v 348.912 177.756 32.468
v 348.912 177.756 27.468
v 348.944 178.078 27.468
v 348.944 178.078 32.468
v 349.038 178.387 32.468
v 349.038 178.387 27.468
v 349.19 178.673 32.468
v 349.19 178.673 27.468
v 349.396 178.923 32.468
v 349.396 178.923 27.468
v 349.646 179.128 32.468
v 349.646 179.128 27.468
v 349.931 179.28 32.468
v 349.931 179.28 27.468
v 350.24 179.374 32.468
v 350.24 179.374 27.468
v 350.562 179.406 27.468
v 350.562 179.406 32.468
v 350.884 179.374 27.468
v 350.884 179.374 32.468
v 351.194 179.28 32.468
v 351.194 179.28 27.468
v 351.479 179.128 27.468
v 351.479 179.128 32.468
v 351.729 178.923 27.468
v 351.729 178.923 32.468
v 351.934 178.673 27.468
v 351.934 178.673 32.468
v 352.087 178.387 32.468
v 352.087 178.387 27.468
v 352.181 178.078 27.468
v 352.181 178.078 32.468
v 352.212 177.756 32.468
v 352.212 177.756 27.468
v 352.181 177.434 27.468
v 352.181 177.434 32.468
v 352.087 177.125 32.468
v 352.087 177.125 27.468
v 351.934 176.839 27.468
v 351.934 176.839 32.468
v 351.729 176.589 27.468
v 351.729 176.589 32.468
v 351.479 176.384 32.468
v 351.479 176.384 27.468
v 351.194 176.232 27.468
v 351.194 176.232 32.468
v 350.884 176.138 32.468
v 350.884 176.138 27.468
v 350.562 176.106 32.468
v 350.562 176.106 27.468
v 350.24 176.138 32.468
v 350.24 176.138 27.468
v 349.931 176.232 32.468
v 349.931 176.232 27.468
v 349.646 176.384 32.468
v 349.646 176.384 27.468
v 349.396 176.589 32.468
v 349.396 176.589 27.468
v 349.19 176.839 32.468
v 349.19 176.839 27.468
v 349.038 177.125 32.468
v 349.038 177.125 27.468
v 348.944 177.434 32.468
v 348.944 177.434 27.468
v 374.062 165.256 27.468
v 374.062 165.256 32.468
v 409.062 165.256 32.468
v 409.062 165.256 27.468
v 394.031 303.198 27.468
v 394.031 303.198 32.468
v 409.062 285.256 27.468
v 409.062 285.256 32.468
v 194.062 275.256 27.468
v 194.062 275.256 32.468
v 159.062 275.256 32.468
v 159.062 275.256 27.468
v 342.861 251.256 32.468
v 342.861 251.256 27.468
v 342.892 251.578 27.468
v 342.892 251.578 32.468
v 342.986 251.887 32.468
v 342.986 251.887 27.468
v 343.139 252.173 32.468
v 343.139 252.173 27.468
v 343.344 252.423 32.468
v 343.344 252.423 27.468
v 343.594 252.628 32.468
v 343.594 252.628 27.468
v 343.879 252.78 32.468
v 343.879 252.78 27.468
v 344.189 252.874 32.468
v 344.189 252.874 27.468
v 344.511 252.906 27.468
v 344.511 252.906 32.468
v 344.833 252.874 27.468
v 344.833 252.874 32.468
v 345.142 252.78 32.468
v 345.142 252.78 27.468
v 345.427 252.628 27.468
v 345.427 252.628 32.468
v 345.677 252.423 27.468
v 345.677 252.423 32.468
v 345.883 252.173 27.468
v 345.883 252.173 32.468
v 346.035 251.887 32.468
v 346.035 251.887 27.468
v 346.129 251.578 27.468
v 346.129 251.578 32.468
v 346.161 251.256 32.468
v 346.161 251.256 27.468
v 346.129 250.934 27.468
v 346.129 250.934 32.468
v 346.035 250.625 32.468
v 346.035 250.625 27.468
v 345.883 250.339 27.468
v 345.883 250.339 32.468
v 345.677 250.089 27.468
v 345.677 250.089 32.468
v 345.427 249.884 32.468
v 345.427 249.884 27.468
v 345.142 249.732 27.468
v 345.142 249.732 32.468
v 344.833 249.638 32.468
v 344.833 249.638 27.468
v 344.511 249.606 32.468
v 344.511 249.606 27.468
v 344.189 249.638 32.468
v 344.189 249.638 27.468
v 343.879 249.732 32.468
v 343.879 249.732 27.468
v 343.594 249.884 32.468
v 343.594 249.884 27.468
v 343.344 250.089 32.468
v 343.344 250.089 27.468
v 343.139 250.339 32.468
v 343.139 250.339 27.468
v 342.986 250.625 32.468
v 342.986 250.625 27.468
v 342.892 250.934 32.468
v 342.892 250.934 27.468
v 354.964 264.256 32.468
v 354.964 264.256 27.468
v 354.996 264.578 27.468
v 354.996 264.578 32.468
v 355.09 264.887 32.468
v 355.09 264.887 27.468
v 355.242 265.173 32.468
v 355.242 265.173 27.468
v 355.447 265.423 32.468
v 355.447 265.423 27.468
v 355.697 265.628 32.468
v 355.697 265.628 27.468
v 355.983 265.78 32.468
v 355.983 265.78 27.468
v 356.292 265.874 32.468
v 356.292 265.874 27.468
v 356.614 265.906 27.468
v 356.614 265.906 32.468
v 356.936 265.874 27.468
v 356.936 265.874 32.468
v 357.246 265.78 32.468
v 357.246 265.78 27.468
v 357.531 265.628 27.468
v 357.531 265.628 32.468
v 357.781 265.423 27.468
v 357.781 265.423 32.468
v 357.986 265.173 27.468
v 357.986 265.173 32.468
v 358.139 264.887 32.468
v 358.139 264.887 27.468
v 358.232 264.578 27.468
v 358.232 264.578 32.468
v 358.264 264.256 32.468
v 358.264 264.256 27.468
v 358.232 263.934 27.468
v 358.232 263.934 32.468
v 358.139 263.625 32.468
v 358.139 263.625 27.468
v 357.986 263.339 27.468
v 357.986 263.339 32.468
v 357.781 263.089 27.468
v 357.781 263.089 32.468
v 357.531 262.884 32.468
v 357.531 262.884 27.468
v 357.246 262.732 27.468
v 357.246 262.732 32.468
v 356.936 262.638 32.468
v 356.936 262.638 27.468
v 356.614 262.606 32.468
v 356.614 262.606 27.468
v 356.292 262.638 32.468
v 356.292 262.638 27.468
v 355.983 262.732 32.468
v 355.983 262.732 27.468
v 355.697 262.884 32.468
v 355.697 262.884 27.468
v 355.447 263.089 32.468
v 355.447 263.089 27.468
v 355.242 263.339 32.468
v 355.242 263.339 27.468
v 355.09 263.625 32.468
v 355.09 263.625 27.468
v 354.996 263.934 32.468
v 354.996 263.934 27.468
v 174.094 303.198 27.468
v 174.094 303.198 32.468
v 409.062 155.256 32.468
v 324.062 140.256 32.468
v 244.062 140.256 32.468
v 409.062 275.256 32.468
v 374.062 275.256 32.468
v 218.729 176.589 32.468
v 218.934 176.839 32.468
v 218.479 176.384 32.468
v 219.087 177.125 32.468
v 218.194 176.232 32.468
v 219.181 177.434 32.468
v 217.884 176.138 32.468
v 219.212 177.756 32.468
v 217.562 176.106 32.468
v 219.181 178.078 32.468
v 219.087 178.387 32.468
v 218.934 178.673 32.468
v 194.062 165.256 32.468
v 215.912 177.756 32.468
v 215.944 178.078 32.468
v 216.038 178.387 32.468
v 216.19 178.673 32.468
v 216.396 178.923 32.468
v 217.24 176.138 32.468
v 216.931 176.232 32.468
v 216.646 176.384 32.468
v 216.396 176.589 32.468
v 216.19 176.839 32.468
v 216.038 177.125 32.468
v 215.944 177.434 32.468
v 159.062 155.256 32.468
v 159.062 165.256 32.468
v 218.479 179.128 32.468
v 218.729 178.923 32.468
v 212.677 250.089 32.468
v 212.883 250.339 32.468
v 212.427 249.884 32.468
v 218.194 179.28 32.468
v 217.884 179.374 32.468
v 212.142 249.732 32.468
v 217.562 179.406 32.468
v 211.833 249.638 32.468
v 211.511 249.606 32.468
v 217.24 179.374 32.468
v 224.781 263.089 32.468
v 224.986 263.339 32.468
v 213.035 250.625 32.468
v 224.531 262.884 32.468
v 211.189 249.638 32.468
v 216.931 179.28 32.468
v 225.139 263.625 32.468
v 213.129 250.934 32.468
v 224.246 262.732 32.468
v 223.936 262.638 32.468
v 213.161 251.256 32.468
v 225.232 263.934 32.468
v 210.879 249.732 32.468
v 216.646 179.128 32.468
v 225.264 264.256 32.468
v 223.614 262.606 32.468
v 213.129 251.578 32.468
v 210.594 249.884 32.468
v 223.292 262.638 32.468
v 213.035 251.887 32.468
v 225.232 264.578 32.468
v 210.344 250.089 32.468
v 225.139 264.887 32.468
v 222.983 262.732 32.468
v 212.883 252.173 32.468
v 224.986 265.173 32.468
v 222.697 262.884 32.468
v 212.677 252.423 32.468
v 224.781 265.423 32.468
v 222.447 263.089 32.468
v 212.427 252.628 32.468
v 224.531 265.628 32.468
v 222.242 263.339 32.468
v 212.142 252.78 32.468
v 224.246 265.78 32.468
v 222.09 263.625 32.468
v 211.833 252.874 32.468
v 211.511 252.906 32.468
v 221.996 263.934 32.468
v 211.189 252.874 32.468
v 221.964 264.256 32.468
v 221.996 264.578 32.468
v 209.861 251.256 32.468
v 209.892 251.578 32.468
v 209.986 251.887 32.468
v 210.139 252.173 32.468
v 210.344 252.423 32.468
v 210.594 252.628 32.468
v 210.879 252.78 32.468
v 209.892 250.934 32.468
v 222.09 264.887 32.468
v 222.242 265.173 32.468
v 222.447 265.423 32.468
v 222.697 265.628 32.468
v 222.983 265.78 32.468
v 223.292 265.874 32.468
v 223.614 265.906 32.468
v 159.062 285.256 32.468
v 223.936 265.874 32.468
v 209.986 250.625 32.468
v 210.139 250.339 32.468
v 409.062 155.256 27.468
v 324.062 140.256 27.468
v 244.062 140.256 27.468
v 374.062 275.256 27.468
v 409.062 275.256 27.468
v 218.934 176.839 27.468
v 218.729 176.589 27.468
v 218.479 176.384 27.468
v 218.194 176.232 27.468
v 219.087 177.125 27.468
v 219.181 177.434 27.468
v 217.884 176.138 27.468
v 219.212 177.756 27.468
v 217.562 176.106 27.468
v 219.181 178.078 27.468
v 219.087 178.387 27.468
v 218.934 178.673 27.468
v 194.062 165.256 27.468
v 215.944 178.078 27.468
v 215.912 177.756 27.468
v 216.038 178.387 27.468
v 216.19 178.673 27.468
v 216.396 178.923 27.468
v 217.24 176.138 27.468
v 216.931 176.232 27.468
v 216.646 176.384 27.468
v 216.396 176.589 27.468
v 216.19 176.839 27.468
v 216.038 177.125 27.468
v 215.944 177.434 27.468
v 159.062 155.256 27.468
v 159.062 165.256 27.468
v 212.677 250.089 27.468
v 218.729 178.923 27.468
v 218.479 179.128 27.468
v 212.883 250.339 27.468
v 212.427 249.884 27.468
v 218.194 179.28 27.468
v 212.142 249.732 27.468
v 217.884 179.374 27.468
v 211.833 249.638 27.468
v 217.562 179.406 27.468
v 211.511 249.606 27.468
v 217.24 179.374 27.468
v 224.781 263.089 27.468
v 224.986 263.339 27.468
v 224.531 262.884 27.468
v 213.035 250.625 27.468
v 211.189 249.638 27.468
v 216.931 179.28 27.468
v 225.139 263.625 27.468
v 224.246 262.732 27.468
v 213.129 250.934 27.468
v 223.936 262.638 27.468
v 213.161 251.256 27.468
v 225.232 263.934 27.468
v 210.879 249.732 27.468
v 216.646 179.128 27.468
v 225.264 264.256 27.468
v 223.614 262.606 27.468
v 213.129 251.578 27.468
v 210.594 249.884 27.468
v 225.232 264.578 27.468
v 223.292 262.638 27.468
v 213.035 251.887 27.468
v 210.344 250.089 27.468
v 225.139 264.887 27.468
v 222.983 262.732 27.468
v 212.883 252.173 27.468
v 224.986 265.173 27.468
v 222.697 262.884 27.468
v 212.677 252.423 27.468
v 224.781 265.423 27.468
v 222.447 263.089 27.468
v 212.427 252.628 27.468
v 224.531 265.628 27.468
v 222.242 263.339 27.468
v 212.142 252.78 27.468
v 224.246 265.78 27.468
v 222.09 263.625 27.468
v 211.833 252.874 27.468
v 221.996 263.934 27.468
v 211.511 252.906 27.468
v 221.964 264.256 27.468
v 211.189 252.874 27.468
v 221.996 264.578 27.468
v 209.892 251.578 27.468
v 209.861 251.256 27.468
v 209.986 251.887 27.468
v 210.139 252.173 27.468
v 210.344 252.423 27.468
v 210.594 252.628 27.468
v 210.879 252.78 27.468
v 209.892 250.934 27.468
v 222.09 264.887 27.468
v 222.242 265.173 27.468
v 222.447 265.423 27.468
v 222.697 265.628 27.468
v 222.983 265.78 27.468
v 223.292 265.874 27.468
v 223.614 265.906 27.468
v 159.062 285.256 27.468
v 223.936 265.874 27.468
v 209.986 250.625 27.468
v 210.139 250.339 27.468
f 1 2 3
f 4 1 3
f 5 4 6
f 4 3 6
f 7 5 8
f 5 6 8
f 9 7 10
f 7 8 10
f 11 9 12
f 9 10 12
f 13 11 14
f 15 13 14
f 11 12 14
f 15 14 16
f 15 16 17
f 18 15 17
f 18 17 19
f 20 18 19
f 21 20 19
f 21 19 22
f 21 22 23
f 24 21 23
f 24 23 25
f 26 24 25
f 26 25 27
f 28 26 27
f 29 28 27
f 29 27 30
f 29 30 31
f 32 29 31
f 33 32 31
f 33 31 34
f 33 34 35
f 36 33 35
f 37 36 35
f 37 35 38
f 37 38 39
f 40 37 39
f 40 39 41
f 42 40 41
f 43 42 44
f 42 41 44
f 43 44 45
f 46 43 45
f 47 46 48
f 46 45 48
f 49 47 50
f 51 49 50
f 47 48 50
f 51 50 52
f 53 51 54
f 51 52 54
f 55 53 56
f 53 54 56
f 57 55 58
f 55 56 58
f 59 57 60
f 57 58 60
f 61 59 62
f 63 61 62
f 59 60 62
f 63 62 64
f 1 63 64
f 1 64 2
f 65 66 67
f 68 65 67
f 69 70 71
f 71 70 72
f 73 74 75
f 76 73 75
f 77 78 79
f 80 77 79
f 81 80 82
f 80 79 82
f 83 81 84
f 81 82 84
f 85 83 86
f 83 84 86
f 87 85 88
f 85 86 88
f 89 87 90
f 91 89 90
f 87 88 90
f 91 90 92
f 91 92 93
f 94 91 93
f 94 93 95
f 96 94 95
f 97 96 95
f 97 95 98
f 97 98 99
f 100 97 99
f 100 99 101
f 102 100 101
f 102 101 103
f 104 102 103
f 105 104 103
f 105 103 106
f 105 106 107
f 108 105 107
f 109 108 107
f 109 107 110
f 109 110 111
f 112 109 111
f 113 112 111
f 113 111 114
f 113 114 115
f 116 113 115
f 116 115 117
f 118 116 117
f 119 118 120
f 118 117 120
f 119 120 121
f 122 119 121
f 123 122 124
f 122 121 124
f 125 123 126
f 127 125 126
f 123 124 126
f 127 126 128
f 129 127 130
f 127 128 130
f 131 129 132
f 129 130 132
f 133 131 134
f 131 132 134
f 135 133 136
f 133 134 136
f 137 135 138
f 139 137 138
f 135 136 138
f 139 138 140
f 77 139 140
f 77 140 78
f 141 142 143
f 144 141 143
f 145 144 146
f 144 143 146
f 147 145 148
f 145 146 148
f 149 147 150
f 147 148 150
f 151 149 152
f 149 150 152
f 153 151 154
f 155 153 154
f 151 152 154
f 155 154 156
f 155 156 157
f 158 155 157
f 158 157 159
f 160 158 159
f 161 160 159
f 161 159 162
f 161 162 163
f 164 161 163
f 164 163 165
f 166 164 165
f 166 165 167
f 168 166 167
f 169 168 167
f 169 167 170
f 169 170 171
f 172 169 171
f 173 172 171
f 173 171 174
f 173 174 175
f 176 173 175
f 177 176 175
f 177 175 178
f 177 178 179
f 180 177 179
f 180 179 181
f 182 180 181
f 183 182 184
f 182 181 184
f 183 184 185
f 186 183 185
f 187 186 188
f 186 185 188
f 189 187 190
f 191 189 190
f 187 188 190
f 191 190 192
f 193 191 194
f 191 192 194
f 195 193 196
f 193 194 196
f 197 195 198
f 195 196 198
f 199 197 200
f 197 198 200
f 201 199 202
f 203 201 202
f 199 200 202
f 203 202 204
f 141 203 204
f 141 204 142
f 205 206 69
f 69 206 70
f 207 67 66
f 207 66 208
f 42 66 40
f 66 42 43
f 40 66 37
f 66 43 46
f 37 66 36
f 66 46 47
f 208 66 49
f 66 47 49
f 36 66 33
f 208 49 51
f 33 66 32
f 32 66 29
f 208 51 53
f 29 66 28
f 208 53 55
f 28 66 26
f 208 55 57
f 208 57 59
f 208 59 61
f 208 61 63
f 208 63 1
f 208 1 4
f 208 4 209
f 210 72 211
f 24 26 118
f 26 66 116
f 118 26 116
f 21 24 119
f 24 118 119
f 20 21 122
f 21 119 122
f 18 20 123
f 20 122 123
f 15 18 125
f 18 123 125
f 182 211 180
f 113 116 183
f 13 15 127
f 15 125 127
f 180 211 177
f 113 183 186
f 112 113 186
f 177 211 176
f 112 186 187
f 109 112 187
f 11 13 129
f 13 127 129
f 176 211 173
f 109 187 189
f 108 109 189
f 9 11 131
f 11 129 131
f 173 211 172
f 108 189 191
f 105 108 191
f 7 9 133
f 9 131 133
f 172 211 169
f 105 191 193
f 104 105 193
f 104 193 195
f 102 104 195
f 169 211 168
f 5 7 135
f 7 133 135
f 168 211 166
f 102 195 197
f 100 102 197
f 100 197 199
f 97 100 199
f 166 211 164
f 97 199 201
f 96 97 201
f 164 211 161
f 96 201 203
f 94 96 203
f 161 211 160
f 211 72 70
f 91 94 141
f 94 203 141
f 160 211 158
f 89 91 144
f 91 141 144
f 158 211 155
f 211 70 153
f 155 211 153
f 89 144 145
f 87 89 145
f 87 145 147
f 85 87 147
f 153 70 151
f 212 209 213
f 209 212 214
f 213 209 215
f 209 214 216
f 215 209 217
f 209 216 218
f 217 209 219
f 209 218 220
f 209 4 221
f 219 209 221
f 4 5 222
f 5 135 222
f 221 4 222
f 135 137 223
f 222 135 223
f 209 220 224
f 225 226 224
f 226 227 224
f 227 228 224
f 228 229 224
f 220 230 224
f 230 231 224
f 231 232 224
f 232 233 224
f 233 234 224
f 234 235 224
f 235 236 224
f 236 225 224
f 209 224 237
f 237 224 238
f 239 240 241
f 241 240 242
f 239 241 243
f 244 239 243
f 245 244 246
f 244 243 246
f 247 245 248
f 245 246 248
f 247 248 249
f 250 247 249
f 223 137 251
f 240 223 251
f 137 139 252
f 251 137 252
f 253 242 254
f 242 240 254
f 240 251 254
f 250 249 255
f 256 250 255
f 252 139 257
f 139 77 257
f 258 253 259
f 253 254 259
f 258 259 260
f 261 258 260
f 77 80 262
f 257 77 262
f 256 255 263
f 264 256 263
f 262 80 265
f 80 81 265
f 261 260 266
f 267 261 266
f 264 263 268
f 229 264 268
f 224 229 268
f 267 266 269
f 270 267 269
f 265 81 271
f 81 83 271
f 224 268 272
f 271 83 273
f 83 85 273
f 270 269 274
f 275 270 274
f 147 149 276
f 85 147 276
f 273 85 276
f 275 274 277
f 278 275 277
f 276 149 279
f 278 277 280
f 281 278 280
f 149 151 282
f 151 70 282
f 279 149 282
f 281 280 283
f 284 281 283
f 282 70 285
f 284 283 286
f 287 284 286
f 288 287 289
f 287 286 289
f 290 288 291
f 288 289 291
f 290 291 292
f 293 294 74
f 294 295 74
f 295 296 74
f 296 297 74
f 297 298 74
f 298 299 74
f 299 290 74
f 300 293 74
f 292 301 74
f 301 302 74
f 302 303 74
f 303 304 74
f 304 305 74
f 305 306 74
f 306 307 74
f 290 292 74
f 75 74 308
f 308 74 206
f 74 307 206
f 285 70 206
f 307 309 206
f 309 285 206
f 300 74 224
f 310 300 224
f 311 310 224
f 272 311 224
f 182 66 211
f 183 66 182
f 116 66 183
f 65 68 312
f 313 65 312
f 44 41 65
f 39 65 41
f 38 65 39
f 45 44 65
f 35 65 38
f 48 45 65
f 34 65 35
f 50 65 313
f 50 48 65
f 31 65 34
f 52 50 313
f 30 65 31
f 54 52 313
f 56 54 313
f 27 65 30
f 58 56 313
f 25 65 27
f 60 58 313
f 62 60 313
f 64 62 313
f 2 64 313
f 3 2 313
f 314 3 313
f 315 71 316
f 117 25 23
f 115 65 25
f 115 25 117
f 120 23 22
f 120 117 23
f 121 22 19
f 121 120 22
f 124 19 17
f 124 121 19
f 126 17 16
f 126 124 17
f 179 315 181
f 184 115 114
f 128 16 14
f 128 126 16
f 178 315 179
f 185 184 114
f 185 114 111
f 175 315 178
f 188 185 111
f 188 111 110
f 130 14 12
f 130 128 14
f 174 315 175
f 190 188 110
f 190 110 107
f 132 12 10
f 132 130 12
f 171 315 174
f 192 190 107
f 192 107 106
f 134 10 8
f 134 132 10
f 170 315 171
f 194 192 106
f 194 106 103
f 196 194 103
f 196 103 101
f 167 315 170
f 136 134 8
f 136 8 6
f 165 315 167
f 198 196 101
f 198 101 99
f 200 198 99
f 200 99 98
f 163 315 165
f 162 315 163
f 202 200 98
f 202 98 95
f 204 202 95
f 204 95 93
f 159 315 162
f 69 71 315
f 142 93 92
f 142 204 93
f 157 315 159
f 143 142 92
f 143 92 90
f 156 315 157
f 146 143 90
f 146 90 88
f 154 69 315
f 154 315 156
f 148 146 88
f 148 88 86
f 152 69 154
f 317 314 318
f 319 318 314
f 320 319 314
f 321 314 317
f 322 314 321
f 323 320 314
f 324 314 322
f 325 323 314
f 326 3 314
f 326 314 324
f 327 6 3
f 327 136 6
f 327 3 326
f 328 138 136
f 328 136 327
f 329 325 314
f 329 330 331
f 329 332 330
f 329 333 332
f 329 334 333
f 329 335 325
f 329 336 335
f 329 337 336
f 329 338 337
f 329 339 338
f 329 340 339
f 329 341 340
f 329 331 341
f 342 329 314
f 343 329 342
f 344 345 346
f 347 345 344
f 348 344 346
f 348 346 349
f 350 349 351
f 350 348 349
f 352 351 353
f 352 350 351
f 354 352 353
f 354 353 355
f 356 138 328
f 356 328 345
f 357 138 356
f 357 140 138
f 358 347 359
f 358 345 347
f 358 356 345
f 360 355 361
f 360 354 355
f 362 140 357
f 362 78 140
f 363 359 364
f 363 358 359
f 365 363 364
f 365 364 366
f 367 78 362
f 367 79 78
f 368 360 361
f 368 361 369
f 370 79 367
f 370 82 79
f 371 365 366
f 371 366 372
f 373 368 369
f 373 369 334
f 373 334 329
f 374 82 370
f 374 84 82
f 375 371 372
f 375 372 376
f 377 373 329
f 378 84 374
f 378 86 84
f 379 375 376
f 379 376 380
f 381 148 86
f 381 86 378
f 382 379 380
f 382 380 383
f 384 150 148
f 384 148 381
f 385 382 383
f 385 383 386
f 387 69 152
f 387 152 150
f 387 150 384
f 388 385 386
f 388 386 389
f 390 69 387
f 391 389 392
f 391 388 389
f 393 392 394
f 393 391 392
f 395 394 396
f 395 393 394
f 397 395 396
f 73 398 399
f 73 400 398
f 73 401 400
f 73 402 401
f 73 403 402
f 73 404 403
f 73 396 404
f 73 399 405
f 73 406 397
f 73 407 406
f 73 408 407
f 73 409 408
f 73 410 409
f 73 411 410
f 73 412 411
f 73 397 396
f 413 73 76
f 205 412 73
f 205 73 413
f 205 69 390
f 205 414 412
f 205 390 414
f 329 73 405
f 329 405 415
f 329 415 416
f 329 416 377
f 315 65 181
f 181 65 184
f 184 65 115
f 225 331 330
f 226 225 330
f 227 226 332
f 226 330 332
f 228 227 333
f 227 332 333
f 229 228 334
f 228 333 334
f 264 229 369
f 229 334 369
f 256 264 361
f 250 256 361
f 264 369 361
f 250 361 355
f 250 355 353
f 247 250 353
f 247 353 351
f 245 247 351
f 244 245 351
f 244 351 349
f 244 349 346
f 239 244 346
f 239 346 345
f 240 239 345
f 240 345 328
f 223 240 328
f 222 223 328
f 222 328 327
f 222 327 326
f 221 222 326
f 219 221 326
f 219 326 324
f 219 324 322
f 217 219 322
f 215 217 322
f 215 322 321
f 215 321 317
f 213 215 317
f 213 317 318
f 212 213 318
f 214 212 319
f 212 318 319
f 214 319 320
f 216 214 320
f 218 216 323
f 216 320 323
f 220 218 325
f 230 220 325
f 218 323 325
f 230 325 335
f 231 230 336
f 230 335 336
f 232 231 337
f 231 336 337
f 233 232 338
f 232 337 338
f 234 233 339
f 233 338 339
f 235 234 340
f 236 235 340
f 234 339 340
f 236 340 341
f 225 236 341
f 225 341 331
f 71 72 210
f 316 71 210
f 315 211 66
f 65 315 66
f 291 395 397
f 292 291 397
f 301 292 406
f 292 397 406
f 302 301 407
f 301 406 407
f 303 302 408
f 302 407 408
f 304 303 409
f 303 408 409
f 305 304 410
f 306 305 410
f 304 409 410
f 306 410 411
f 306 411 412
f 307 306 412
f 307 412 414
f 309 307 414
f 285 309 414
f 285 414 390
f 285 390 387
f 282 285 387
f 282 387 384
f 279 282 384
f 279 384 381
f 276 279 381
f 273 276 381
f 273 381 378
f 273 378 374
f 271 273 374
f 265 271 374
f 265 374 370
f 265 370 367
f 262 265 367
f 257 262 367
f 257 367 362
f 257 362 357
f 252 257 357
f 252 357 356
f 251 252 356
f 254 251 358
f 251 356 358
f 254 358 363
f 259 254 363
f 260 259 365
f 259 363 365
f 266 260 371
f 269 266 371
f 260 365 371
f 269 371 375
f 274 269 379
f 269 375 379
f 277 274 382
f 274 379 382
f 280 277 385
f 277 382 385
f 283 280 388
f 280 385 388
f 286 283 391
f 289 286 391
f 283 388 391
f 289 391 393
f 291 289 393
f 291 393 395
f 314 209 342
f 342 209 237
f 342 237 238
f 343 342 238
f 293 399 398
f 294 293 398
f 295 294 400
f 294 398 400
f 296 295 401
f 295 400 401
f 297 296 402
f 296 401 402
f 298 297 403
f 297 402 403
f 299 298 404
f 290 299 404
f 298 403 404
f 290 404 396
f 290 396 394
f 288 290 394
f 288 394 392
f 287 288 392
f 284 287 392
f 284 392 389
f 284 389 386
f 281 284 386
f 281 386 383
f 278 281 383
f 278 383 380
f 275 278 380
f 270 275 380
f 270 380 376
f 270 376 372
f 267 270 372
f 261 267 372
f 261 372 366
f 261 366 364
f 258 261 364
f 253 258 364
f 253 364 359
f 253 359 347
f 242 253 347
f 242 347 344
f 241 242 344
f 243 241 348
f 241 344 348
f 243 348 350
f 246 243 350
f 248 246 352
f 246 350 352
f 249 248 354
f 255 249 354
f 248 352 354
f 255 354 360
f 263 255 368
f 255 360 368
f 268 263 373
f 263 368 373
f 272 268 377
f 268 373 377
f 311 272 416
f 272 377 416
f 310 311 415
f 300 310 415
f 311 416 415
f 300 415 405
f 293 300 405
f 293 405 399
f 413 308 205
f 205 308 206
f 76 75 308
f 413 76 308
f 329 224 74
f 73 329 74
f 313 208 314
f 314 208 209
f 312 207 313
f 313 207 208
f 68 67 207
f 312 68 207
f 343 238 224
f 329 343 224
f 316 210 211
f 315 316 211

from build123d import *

# Parameters (mm, degrees)
EXTRUDE_2_DEPTH     = 5
SKETCH_3_R          = 1.65
CUT_EXTRUDE_1_DEPTH = 10


with BuildPart() as part:
    # Эскиз1 → Бобышка-Вытянуть2 (new body)
    with BuildSketch(Plane(origin=(139.725199601, 79.945164962, 32.467820781), x_dir=(-1, 0, 0), z_dir=(0, 0, -1))):
        Polygon((-54.33719348, 85.310831528), (-54.33719348, 195.310831528), (-19.33719348, 195.310831528), (-19.33719348, 205.310831528), (-34.368760963, 223.252548998), (-254.305625996, 223.252548998), (-269.33719348, 205.310831528), (-269.33719348, 195.310831528), (-234.33719348, 195.310831528), (-234.33719348, 85.310831528), (-269.33719348, 85.310831528), (-269.33719348, 75.310831528), (-184.33719348, 60.310831528), (-104.33719348, 60.310831528), (-19.33719348, 75.310831528), (-19.33719348, 85.310831528), align=None)
    extrude(amount=EXTRUDE_2_DEPTH)

    # Эскиз3 → Вырез-Вытянуть1 (cut)
    with BuildSketch(Plane(origin=(0, 0, 27.467820781), x_dir=(-1, 0, 0), z_dir=(0, 0, -1))):
        with Locations((-217.562393081, 177.75599649)):
            Circle(SKETCH_3_R)
        with Locations((-350.562393081, 177.75599649)):
            Circle(SKETCH_3_R)
        with Locations((-356.614117219, 264.25599649)):
            Circle(SKETCH_3_R)
        with Locations((-344.510668943, 251.25599649)):
            Circle(SKETCH_3_R)
        with Locations((-211.510668943, 251.25599649)):
            Circle(SKETCH_3_R)
        with Locations((-223.614117219, 264.25599649)):
            Circle(SKETCH_3_R)
    extrude(amount=-CUT_EXTRUDE_1_DEPTH, mode=Mode.SUBTRACT)


solid = part.part
